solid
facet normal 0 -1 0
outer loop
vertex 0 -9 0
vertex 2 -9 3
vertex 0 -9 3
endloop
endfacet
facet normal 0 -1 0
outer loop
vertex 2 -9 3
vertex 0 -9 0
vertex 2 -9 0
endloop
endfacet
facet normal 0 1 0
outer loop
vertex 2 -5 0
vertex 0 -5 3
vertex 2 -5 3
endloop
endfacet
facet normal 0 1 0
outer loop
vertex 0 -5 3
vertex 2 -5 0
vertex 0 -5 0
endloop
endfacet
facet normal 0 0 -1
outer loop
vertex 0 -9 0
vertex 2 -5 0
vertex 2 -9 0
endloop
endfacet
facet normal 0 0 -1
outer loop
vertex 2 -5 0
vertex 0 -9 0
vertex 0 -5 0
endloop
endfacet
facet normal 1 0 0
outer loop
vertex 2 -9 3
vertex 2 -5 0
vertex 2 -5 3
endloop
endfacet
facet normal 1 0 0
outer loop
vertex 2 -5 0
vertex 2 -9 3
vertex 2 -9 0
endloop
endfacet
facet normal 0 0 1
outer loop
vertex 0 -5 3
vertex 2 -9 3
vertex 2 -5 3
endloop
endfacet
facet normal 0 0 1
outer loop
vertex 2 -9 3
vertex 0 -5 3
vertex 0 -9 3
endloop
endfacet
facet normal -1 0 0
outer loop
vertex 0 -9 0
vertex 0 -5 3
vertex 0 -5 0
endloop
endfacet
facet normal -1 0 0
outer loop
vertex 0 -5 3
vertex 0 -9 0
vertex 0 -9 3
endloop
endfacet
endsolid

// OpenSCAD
// Bug surfaced by the wire twister: `rotate(angle, [axis])` was
// silently dropped to `rotate(angle)` (Z-only). This pins the
// rotation around X to 90 degrees.
rotate(90, [1, 0, 0]) translate([0, 0, 5]) cube([2, 3, 4]);
